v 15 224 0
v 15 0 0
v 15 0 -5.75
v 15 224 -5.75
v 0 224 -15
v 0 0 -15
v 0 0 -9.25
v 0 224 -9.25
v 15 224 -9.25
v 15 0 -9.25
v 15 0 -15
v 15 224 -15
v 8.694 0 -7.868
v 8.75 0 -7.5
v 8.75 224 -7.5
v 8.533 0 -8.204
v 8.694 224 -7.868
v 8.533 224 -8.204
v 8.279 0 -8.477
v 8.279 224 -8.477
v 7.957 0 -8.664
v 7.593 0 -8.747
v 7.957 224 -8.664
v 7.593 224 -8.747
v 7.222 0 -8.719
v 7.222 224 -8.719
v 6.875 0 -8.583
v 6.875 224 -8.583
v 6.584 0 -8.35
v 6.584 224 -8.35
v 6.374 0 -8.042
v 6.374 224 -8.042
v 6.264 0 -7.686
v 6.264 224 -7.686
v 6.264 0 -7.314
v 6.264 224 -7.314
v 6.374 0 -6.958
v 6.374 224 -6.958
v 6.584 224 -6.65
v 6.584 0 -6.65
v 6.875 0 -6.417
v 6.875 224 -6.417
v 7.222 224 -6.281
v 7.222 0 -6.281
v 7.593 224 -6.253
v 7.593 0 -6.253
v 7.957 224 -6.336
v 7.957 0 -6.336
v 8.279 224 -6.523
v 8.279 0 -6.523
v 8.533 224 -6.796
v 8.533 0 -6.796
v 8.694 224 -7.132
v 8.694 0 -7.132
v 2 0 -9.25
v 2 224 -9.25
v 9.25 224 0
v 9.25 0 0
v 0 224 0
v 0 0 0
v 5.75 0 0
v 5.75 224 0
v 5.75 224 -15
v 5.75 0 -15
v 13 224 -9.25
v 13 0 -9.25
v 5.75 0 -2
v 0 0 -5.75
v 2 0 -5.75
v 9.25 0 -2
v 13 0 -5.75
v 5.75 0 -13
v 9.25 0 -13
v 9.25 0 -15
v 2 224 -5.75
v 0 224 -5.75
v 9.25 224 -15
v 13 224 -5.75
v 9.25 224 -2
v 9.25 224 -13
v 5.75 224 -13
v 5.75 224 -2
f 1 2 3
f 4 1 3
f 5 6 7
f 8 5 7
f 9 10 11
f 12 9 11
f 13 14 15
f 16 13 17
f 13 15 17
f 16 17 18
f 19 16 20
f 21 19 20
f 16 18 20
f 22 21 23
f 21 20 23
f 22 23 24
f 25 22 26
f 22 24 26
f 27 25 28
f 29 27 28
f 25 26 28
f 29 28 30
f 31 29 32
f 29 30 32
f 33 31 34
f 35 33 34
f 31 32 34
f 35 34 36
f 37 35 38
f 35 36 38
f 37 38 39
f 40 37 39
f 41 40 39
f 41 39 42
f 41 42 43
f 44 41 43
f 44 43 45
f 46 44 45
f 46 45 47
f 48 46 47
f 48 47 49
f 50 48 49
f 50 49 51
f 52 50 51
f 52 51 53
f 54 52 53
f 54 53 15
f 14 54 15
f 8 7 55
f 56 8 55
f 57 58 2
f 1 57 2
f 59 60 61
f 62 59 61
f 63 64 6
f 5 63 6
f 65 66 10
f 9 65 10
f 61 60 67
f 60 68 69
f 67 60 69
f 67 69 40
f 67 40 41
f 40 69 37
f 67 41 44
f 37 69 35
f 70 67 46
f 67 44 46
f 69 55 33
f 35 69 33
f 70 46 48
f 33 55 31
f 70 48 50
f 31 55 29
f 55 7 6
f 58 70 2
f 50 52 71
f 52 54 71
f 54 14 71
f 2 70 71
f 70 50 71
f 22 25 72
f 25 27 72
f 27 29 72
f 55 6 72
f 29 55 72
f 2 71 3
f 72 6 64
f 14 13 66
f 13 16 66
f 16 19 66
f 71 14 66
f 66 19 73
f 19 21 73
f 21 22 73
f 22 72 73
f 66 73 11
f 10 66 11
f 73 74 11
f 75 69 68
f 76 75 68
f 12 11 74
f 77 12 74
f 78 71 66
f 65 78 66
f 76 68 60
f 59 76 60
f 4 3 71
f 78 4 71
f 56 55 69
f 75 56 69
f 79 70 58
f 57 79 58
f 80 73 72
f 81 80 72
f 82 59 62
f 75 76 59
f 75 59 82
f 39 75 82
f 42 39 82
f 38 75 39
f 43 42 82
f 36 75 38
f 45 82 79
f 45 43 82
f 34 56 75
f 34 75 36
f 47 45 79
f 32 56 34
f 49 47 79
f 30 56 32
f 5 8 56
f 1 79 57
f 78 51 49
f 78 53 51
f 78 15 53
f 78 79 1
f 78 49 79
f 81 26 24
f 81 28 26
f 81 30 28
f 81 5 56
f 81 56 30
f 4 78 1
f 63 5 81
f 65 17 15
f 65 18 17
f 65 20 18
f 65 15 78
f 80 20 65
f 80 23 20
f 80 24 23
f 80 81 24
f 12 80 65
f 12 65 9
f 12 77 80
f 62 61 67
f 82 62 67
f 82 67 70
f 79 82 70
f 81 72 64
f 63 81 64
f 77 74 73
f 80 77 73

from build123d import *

# Parameters (mm, degrees)
BOSS_EXTRUDE1_DEPTH = 224
SKETCH2_R           = 1.25
CUT_EXTRUDE1_DEPTH  = 225


with BuildPart() as part:
    # Sketch1 → Boss-Extrude1 (new body)
    with BuildSketch(Plane(origin=(0, 0, 0), x_dir=(1, 0, 0), z_dir=(0, 1, 0))):
        Polygon((0, 5.75), (0, 0), (5.75, 0), (5.75, 2), (9.25, 2), (9.25, 0), (15, 0), (15, 5.75), (13, 5.75), (13, 9.25), (15, 9.25), (15, 15), (9.25, 15), (9.25, 13), (5.75, 13), (5.75, 15), (0, 15), (0, 9.25), (2, 9.25), (2, 5.75), align=None)
    extrude(amount=BOSS_EXTRUDE1_DEPTH)

    # Sketch2 → Cut-Extrude1 (cut, through all)
    with BuildSketch(Plane(origin=(0, 224, 0), x_dir=(1, 0, 0), z_dir=(0, 1, 0))):
        with Locations((7.5, 7.5)):
            Circle(SKETCH2_R)
    extrude(amount=-CUT_EXTRUDE1_DEPTH, mode=Mode.SUBTRACT)


solid = part.part
